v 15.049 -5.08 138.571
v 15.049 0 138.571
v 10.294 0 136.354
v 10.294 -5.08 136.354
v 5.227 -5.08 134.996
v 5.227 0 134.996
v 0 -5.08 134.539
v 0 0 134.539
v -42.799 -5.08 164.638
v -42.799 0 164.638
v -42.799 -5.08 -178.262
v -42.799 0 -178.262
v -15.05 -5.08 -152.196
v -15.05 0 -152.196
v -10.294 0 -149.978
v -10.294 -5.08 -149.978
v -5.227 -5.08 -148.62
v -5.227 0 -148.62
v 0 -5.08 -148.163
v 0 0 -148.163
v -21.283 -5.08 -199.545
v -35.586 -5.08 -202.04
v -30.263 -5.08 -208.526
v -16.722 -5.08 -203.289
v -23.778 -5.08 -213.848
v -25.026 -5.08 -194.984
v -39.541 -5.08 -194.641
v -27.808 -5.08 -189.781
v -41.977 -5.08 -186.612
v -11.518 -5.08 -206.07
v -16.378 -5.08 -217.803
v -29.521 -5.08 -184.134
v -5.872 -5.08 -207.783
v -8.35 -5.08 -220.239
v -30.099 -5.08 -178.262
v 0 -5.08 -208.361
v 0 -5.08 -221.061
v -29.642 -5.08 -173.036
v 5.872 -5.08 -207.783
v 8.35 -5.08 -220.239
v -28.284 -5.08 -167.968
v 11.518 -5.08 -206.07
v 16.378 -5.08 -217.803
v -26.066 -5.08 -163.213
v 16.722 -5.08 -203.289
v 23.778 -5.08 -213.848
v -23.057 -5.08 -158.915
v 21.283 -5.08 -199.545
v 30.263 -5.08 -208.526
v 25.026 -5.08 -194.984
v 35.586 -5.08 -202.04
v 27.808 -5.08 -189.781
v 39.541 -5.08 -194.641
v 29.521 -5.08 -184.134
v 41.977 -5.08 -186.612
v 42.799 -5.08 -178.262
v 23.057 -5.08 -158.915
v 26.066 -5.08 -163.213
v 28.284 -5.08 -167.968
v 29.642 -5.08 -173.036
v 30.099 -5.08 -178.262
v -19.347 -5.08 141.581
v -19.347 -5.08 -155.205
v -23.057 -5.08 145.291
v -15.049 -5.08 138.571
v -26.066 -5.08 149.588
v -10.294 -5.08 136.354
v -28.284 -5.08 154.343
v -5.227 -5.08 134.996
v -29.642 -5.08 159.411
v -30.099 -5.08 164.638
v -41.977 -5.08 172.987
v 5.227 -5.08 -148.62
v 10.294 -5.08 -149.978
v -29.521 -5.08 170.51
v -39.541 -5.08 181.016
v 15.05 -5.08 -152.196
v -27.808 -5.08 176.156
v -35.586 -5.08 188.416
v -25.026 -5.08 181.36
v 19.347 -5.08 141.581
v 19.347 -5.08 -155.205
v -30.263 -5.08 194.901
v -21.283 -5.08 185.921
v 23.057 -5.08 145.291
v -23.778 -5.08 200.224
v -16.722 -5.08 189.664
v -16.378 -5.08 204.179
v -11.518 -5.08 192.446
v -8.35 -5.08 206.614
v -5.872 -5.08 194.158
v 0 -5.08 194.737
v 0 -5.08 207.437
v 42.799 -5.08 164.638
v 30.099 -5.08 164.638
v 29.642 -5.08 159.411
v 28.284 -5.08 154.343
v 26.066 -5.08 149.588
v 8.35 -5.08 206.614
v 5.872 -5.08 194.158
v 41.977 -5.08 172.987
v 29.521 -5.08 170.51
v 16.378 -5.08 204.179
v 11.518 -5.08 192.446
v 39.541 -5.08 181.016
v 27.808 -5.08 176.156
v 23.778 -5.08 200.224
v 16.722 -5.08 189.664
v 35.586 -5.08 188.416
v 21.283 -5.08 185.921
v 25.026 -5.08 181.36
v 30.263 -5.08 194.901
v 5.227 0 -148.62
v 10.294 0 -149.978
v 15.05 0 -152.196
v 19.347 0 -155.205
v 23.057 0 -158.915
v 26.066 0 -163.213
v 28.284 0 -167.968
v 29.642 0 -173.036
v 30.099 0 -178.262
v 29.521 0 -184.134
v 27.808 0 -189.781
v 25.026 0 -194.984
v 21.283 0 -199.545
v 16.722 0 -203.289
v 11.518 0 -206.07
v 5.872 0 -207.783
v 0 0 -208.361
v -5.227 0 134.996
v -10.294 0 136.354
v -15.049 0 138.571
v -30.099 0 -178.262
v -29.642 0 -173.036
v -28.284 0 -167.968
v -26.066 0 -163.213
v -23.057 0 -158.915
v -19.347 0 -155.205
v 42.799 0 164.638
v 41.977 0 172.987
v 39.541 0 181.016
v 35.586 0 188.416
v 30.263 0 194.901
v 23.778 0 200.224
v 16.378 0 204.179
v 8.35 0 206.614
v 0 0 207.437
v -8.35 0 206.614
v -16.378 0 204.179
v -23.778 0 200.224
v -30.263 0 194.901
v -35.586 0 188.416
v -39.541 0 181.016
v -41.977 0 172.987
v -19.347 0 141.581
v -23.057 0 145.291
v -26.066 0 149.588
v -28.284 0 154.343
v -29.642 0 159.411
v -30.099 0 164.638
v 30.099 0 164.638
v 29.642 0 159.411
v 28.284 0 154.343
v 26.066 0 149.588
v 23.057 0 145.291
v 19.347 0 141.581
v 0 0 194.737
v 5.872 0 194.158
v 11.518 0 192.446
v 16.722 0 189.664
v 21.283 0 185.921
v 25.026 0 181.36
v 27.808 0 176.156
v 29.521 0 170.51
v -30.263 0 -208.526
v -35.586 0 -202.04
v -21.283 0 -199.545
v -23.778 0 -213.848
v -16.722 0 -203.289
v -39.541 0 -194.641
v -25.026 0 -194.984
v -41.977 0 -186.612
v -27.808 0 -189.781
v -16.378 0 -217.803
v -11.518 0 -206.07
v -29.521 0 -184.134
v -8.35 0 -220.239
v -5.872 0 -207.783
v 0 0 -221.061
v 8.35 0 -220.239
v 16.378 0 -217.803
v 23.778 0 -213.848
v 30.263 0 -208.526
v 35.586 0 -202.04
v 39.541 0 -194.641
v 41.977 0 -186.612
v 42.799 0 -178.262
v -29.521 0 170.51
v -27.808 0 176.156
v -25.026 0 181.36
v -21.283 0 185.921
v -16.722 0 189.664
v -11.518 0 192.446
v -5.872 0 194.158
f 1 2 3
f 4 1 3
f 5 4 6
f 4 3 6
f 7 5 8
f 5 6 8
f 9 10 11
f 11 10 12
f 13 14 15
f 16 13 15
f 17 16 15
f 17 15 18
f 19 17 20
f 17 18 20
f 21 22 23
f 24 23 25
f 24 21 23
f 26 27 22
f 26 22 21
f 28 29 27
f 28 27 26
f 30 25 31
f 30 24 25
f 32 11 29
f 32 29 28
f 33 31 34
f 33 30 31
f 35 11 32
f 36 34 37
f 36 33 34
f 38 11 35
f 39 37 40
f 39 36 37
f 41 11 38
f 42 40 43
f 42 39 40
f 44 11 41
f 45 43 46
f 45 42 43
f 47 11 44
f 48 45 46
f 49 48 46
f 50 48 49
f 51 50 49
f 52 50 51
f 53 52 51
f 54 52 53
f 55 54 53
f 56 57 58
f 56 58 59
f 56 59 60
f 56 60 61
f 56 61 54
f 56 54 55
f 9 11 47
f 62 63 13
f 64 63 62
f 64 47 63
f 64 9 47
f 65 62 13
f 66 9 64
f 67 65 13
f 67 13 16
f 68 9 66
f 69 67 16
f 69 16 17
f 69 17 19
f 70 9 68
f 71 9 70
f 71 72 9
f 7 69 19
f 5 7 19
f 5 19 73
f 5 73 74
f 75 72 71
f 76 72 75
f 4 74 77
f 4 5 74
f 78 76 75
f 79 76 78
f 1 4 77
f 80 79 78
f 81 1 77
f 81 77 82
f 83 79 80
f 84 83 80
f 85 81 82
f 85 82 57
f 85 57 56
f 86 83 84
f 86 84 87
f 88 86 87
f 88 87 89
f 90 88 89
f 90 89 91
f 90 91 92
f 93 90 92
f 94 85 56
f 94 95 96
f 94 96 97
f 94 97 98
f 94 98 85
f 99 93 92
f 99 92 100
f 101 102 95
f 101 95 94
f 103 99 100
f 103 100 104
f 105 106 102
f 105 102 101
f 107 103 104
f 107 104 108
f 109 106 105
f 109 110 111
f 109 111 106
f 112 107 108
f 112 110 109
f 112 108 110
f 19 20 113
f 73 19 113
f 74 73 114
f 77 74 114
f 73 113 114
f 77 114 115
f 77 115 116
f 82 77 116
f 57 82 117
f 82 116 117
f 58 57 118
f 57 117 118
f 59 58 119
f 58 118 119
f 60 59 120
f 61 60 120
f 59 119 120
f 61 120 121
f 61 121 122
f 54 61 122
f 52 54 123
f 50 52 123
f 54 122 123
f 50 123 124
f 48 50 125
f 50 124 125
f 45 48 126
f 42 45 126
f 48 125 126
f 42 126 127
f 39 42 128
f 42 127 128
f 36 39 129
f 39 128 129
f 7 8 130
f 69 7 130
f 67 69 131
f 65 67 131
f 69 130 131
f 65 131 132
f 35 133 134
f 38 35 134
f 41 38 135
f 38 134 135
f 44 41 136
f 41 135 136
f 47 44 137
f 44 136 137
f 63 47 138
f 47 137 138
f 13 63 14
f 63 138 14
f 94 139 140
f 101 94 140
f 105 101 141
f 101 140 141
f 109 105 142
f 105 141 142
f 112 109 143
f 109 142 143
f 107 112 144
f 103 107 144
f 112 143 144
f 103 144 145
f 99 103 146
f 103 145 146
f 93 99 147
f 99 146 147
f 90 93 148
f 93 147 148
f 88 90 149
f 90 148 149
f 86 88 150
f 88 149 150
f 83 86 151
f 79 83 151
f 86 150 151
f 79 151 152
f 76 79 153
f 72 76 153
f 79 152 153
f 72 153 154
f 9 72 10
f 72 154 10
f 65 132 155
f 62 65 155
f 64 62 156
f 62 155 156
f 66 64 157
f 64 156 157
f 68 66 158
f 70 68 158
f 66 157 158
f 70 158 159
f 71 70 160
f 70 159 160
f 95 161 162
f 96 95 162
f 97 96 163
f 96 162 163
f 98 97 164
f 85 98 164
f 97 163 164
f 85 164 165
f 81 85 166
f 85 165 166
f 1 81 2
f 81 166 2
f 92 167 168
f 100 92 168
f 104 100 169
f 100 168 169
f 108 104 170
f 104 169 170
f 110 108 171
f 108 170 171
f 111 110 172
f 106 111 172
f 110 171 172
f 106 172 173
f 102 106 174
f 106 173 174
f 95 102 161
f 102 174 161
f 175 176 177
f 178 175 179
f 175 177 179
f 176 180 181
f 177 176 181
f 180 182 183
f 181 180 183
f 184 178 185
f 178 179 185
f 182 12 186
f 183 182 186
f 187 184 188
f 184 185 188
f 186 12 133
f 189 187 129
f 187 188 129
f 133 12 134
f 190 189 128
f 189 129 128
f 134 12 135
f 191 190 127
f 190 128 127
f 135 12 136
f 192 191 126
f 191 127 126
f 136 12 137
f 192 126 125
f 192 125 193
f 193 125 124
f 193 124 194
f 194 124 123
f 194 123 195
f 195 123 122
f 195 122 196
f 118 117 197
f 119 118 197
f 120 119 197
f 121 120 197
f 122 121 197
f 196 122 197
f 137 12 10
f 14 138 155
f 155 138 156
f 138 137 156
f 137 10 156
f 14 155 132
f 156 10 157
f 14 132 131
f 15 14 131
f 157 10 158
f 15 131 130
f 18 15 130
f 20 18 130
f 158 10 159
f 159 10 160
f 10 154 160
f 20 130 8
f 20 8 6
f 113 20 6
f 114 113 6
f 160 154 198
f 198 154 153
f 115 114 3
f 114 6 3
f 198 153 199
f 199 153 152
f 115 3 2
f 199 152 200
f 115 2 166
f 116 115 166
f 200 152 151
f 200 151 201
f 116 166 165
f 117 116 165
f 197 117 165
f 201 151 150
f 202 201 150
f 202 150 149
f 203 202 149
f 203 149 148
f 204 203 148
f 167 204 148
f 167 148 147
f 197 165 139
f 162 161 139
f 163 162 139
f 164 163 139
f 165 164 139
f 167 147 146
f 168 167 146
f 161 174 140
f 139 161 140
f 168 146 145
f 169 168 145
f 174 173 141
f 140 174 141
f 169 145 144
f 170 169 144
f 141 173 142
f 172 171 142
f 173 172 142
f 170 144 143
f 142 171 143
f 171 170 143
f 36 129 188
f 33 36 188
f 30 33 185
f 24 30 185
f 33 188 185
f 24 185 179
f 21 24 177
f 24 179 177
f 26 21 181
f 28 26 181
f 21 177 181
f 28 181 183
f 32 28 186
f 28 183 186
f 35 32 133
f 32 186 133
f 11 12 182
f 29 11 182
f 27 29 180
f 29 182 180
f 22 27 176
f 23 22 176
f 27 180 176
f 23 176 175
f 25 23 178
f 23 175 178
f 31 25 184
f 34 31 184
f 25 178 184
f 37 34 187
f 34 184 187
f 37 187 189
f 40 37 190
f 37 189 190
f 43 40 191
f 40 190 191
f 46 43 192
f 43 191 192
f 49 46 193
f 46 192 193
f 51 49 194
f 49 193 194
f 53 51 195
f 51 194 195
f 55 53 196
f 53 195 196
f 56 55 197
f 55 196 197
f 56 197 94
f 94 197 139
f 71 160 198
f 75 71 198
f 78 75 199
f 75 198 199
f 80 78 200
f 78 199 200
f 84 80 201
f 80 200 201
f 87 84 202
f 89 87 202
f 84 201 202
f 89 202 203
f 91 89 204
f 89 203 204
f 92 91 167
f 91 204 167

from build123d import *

# Parameters (mm, degrees)
F1_DEPTH = 5.08


with BuildPart() as f1:
    # F0 (on Front) → F1 (new body)
    with BuildSketch(Plane.XZ):
        with BuildLine():
            Line((-30.099, -178.2621852636), (-42.799, -178.2621852636))
            ThreePointArc((-42.799, -178.2621852636), (-30.263463128, -208.5256483916), (0, -221.0611852636))
            Line((0, -221.0611852636), (0, -208.3611852636))
            ThreePointArc((0, -208.3611852636), (-21.2832070069, -199.5453922706), (-30.099, -178.2621852636))
        make_face()
        with BuildLine():
            ThreePointArc((0, -221.0611852636), (30.263463128, -208.5256483916), (42.799, -178.2621852636))
            Line((42.799, -178.2621852636), (30.099, -178.2621852636))
            ThreePointArc((30.099, -178.2621852636), (21.2832070069, -199.5453922706), (0, -208.3611852636))
            Line((0, -208.3611852636), (0, -221.0611852636))
        make_face()
        with BuildLine():
            Line((42.799, 164.6378147364), (30.099, 164.6378147364))
            Line((30.099, 164.6378147364), (30.099, 134.2107774176))
            ThreePointArc((30.099, 134.2107774176), (39.4965916378, 148.1522559045), (42.799, 164.6378147364))
        make_face()
        with BuildLine():
            ThreePointArc((42.799, -178.2621852636), (39.4965916378, -161.7766264317), (30.099, -147.8351479448))
            Line((30.099, -147.8351479448), (30.099, -178.2621852636))
            Line((30.099, -178.2621852636), (42.799, -178.2621852636))
        make_face()
        with BuildLine():
            Line((-30.099, 134.2107774176), (-30.099, 164.6378147364))
            Line((-30.099, 164.6378147364), (-42.799, 164.6378147364))
            ThreePointArc((-42.799, 164.6378147364), (-39.4965916378, 148.1522559045), (-30.099, 134.2107774176))
        make_face()
        with BuildLine():
            Line((-30.099, -178.2621852636), (-30.099, -147.8351479448))
            ThreePointArc((-30.099, -147.8351479448), (-39.4965916378, -161.7766264317), (-42.799, -178.2621852636))
            Line((-42.799, -178.2621852636), (-30.099, -178.2621852636))
        make_face()
        with BuildLine():
            ThreePointArc((15.0495, -138.1964024715), (7.6478416327, -136.1520330511), (0, -135.4631852636))
            Line((0, -135.4631852636), (0, -148.1631852636))
            ThreePointArc((0, -148.1631852636), (7.7901944385, -149.1887838182), (15.0495, -152.1956866351))
            Line((15.0495, -152.1956866351), (15.0495, -138.1964024715))
        make_face()
        with BuildLine():
            Line((0, -148.1631852636), (0, -135.4631852636))
            ThreePointArc((0, -135.4631852636), (-7.6478416327, -136.1520330511), (-15.0495, -138.1964024715))
            Line((-15.0495, -138.1964024715), (-15.0495, -152.1956866351))
            ThreePointArc((-15.0495, -152.1956866351), (-7.7901944385, -149.1887838182), (0, -148.1631852636))
        make_face()
        with BuildLine():
            Line((0, 121.8388147364), (0, 134.5388147364))
            ThreePointArc((0, 134.5388147364), (-7.7901944385, 135.5644132909), (-15.0495, 138.5713161079))
            Line((-15.0495, 138.5713161079), (-15.0495, 124.5720319442))
            ThreePointArc((-15.0495, 124.5720319442), (-7.6478416327, 122.5276625239), (0, 121.8388147364))
        make_face()
        with BuildLine():
            ThreePointArc((15.0495, 138.5713161079), (7.7901944385, 135.5644132909), (0, 134.5388147364))
            Line((0, 134.5388147364), (0, 121.8388147364))
            ThreePointArc((0, 121.8388147364), (7.6478416327, 122.5276625239), (15.0495, 124.5720319442))
            Line((15.0495, 124.5720319442), (15.0495, 138.5713161079))
        make_face()
        with BuildLine():
            ThreePointArc((30.099, 164.6378147364), (26.0664986285, 149.5883147364), (15.0495, 138.5713161079))
            Line((15.0495, 138.5713161079), (15.0495, 124.5720319442))
            ThreePointArc((15.0495, 124.5720319442), (23.0829616089, 128.5971254483), (30.099, 134.2107774176))
            Line((30.099, 134.2107774176), (30.099, 164.6378147364))
        make_face()
        with BuildLine():
            ThreePointArc((30.099, -147.8351479448), (23.0829616089, -142.2214959755), (15.0495, -138.1964024715))
            Line((15.0495, -138.1964024715), (15.0495, -152.1956866351))
            ThreePointArc((15.0495, -152.1956866351), (26.0664986285, -163.2126852636), (30.099, -178.2621852636))
            Line((30.099, -178.2621852636), (30.099, -147.8351479448))
        make_face()
        with BuildLine():
            Line((-15.0495, -152.1956866351), (-15.0495, -138.1964024715))
            ThreePointArc((-15.0495, -138.1964024715), (-23.0829616089, -142.2214959755), (-30.099, -147.8351479448))
            Line((-30.099, -147.8351479448), (-30.099, -178.2621852636))
            ThreePointArc((-30.099, -178.2621852636), (-26.0664986285, -163.2126852636), (-15.0495, -152.1956866351))
        make_face()
        with BuildLine():
            Line((-15.0495, 124.5720319442), (-15.0495, 138.5713161079))
            ThreePointArc((-15.0495, 138.5713161079), (-26.0664986285, 149.5883147364), (-30.099, 164.6378147364))
            Line((-30.099, 164.6378147364), (-30.099, 134.2107774176))
            ThreePointArc((-30.099, 134.2107774176), (-23.0829616089, 128.5971254483), (-15.0495, 124.5720319442))
        make_face()
        with BuildLine():
            Line((-42.799, 164.6378147364), (-30.099, 164.6378147364))
            ThreePointArc((-30.099, 164.6378147364), (-21.2832070069, 185.9210217433), (0, 194.7368147364))
            Line((0, 194.7368147364), (0, 207.4368147364))
            ThreePointArc((0, 207.4368147364), (-30.263463128, 194.9012778644), (-42.799, 164.6378147364))
        make_face()
        with BuildLine():
            ThreePointArc((0, 194.7368147364), (21.2832070069, 185.9210217433), (30.099, 164.6378147364))
            Line((30.099, 164.6378147364), (42.799, 164.6378147364))
            ThreePointArc((42.799, 164.6378147364), (30.263463128, 194.9012778644), (0, 207.4368147364))
            Line((0, 207.4368147364), (0, 194.7368147364))
        make_face()
        with BuildLine():
            ThreePointArc((42.799, 164.6378147364), (39.4965916378, 148.1522559045), (30.099, 134.2107774176))
            Line((30.099, 134.2107774176), (30.099, -147.8351479448))
            ThreePointArc((30.099, -147.8351479448), (39.4965916378, -161.7766264317), (42.799, -178.2621852636))
            Line((42.799, -178.2621852636), (42.799, 164.6378147364))
        make_face()
        with BuildLine():
            Line((-30.099, -147.8351479448), (-30.099, 134.2107774176))
            ThreePointArc((-30.099, 134.2107774176), (-39.4965916378, 148.1522559045), (-42.799, 164.6378147364))
            Line((-42.799, 164.6378147364), (-42.799, -178.2621852636))
            ThreePointArc((-42.799, -178.2621852636), (-39.4965916378, -161.7766264317), (-30.099, -147.8351479448))
        make_face()
        with BuildLine():
            Line((0, -135.4631852636), (0, 121.8388147364))
            ThreePointArc((0, 121.8388147364), (-7.6478416327, 122.5276625239), (-15.0495, 124.5720319442))
            Line((-15.0495, 124.5720319442), (-15.0495, -138.1964024715))
            ThreePointArc((-15.0495, -138.1964024715), (-7.6478416327, -136.1520330511), (0, -135.4631852636))
        make_face()
        with BuildLine():
            ThreePointArc((15.0495, 124.5720319442), (7.6478416327, 122.5276625239), (0, 121.8388147364))
            Line((0, 121.8388147364), (0, -135.4631852636))
            ThreePointArc((0, -135.4631852636), (7.6478416327, -136.1520330511), (15.0495, -138.1964024715))
            Line((15.0495, -138.1964024715), (15.0495, 124.5720319442))
        make_face()
        with BuildLine():
            ThreePointArc((30.099, 134.2107774176), (23.0829616089, 128.5971254483), (15.0495, 124.5720319442))
            Line((15.0495, 124.5720319442), (15.0495, -138.1964024715))
            ThreePointArc((15.0495, -138.1964024715), (23.0829616089, -142.2214959755), (30.099, -147.8351479448))
            Line((30.099, -147.8351479448), (30.099, 134.2107774176))
        make_face()
        with BuildLine():
            Line((-15.0495, -138.1964024715), (-15.0495, 124.5720319442))
            ThreePointArc((-15.0495, 124.5720319442), (-23.0829616089, 128.5971254483), (-30.099, 134.2107774176))
            Line((-30.099, 134.2107774176), (-30.099, -147.8351479448))
            ThreePointArc((-30.099, -147.8351479448), (-23.0829616089, -142.2214959755), (-15.0495, -138.1964024715))
        make_face()
    extrude(amount=F1_DEPTH)


solid = f1.part
